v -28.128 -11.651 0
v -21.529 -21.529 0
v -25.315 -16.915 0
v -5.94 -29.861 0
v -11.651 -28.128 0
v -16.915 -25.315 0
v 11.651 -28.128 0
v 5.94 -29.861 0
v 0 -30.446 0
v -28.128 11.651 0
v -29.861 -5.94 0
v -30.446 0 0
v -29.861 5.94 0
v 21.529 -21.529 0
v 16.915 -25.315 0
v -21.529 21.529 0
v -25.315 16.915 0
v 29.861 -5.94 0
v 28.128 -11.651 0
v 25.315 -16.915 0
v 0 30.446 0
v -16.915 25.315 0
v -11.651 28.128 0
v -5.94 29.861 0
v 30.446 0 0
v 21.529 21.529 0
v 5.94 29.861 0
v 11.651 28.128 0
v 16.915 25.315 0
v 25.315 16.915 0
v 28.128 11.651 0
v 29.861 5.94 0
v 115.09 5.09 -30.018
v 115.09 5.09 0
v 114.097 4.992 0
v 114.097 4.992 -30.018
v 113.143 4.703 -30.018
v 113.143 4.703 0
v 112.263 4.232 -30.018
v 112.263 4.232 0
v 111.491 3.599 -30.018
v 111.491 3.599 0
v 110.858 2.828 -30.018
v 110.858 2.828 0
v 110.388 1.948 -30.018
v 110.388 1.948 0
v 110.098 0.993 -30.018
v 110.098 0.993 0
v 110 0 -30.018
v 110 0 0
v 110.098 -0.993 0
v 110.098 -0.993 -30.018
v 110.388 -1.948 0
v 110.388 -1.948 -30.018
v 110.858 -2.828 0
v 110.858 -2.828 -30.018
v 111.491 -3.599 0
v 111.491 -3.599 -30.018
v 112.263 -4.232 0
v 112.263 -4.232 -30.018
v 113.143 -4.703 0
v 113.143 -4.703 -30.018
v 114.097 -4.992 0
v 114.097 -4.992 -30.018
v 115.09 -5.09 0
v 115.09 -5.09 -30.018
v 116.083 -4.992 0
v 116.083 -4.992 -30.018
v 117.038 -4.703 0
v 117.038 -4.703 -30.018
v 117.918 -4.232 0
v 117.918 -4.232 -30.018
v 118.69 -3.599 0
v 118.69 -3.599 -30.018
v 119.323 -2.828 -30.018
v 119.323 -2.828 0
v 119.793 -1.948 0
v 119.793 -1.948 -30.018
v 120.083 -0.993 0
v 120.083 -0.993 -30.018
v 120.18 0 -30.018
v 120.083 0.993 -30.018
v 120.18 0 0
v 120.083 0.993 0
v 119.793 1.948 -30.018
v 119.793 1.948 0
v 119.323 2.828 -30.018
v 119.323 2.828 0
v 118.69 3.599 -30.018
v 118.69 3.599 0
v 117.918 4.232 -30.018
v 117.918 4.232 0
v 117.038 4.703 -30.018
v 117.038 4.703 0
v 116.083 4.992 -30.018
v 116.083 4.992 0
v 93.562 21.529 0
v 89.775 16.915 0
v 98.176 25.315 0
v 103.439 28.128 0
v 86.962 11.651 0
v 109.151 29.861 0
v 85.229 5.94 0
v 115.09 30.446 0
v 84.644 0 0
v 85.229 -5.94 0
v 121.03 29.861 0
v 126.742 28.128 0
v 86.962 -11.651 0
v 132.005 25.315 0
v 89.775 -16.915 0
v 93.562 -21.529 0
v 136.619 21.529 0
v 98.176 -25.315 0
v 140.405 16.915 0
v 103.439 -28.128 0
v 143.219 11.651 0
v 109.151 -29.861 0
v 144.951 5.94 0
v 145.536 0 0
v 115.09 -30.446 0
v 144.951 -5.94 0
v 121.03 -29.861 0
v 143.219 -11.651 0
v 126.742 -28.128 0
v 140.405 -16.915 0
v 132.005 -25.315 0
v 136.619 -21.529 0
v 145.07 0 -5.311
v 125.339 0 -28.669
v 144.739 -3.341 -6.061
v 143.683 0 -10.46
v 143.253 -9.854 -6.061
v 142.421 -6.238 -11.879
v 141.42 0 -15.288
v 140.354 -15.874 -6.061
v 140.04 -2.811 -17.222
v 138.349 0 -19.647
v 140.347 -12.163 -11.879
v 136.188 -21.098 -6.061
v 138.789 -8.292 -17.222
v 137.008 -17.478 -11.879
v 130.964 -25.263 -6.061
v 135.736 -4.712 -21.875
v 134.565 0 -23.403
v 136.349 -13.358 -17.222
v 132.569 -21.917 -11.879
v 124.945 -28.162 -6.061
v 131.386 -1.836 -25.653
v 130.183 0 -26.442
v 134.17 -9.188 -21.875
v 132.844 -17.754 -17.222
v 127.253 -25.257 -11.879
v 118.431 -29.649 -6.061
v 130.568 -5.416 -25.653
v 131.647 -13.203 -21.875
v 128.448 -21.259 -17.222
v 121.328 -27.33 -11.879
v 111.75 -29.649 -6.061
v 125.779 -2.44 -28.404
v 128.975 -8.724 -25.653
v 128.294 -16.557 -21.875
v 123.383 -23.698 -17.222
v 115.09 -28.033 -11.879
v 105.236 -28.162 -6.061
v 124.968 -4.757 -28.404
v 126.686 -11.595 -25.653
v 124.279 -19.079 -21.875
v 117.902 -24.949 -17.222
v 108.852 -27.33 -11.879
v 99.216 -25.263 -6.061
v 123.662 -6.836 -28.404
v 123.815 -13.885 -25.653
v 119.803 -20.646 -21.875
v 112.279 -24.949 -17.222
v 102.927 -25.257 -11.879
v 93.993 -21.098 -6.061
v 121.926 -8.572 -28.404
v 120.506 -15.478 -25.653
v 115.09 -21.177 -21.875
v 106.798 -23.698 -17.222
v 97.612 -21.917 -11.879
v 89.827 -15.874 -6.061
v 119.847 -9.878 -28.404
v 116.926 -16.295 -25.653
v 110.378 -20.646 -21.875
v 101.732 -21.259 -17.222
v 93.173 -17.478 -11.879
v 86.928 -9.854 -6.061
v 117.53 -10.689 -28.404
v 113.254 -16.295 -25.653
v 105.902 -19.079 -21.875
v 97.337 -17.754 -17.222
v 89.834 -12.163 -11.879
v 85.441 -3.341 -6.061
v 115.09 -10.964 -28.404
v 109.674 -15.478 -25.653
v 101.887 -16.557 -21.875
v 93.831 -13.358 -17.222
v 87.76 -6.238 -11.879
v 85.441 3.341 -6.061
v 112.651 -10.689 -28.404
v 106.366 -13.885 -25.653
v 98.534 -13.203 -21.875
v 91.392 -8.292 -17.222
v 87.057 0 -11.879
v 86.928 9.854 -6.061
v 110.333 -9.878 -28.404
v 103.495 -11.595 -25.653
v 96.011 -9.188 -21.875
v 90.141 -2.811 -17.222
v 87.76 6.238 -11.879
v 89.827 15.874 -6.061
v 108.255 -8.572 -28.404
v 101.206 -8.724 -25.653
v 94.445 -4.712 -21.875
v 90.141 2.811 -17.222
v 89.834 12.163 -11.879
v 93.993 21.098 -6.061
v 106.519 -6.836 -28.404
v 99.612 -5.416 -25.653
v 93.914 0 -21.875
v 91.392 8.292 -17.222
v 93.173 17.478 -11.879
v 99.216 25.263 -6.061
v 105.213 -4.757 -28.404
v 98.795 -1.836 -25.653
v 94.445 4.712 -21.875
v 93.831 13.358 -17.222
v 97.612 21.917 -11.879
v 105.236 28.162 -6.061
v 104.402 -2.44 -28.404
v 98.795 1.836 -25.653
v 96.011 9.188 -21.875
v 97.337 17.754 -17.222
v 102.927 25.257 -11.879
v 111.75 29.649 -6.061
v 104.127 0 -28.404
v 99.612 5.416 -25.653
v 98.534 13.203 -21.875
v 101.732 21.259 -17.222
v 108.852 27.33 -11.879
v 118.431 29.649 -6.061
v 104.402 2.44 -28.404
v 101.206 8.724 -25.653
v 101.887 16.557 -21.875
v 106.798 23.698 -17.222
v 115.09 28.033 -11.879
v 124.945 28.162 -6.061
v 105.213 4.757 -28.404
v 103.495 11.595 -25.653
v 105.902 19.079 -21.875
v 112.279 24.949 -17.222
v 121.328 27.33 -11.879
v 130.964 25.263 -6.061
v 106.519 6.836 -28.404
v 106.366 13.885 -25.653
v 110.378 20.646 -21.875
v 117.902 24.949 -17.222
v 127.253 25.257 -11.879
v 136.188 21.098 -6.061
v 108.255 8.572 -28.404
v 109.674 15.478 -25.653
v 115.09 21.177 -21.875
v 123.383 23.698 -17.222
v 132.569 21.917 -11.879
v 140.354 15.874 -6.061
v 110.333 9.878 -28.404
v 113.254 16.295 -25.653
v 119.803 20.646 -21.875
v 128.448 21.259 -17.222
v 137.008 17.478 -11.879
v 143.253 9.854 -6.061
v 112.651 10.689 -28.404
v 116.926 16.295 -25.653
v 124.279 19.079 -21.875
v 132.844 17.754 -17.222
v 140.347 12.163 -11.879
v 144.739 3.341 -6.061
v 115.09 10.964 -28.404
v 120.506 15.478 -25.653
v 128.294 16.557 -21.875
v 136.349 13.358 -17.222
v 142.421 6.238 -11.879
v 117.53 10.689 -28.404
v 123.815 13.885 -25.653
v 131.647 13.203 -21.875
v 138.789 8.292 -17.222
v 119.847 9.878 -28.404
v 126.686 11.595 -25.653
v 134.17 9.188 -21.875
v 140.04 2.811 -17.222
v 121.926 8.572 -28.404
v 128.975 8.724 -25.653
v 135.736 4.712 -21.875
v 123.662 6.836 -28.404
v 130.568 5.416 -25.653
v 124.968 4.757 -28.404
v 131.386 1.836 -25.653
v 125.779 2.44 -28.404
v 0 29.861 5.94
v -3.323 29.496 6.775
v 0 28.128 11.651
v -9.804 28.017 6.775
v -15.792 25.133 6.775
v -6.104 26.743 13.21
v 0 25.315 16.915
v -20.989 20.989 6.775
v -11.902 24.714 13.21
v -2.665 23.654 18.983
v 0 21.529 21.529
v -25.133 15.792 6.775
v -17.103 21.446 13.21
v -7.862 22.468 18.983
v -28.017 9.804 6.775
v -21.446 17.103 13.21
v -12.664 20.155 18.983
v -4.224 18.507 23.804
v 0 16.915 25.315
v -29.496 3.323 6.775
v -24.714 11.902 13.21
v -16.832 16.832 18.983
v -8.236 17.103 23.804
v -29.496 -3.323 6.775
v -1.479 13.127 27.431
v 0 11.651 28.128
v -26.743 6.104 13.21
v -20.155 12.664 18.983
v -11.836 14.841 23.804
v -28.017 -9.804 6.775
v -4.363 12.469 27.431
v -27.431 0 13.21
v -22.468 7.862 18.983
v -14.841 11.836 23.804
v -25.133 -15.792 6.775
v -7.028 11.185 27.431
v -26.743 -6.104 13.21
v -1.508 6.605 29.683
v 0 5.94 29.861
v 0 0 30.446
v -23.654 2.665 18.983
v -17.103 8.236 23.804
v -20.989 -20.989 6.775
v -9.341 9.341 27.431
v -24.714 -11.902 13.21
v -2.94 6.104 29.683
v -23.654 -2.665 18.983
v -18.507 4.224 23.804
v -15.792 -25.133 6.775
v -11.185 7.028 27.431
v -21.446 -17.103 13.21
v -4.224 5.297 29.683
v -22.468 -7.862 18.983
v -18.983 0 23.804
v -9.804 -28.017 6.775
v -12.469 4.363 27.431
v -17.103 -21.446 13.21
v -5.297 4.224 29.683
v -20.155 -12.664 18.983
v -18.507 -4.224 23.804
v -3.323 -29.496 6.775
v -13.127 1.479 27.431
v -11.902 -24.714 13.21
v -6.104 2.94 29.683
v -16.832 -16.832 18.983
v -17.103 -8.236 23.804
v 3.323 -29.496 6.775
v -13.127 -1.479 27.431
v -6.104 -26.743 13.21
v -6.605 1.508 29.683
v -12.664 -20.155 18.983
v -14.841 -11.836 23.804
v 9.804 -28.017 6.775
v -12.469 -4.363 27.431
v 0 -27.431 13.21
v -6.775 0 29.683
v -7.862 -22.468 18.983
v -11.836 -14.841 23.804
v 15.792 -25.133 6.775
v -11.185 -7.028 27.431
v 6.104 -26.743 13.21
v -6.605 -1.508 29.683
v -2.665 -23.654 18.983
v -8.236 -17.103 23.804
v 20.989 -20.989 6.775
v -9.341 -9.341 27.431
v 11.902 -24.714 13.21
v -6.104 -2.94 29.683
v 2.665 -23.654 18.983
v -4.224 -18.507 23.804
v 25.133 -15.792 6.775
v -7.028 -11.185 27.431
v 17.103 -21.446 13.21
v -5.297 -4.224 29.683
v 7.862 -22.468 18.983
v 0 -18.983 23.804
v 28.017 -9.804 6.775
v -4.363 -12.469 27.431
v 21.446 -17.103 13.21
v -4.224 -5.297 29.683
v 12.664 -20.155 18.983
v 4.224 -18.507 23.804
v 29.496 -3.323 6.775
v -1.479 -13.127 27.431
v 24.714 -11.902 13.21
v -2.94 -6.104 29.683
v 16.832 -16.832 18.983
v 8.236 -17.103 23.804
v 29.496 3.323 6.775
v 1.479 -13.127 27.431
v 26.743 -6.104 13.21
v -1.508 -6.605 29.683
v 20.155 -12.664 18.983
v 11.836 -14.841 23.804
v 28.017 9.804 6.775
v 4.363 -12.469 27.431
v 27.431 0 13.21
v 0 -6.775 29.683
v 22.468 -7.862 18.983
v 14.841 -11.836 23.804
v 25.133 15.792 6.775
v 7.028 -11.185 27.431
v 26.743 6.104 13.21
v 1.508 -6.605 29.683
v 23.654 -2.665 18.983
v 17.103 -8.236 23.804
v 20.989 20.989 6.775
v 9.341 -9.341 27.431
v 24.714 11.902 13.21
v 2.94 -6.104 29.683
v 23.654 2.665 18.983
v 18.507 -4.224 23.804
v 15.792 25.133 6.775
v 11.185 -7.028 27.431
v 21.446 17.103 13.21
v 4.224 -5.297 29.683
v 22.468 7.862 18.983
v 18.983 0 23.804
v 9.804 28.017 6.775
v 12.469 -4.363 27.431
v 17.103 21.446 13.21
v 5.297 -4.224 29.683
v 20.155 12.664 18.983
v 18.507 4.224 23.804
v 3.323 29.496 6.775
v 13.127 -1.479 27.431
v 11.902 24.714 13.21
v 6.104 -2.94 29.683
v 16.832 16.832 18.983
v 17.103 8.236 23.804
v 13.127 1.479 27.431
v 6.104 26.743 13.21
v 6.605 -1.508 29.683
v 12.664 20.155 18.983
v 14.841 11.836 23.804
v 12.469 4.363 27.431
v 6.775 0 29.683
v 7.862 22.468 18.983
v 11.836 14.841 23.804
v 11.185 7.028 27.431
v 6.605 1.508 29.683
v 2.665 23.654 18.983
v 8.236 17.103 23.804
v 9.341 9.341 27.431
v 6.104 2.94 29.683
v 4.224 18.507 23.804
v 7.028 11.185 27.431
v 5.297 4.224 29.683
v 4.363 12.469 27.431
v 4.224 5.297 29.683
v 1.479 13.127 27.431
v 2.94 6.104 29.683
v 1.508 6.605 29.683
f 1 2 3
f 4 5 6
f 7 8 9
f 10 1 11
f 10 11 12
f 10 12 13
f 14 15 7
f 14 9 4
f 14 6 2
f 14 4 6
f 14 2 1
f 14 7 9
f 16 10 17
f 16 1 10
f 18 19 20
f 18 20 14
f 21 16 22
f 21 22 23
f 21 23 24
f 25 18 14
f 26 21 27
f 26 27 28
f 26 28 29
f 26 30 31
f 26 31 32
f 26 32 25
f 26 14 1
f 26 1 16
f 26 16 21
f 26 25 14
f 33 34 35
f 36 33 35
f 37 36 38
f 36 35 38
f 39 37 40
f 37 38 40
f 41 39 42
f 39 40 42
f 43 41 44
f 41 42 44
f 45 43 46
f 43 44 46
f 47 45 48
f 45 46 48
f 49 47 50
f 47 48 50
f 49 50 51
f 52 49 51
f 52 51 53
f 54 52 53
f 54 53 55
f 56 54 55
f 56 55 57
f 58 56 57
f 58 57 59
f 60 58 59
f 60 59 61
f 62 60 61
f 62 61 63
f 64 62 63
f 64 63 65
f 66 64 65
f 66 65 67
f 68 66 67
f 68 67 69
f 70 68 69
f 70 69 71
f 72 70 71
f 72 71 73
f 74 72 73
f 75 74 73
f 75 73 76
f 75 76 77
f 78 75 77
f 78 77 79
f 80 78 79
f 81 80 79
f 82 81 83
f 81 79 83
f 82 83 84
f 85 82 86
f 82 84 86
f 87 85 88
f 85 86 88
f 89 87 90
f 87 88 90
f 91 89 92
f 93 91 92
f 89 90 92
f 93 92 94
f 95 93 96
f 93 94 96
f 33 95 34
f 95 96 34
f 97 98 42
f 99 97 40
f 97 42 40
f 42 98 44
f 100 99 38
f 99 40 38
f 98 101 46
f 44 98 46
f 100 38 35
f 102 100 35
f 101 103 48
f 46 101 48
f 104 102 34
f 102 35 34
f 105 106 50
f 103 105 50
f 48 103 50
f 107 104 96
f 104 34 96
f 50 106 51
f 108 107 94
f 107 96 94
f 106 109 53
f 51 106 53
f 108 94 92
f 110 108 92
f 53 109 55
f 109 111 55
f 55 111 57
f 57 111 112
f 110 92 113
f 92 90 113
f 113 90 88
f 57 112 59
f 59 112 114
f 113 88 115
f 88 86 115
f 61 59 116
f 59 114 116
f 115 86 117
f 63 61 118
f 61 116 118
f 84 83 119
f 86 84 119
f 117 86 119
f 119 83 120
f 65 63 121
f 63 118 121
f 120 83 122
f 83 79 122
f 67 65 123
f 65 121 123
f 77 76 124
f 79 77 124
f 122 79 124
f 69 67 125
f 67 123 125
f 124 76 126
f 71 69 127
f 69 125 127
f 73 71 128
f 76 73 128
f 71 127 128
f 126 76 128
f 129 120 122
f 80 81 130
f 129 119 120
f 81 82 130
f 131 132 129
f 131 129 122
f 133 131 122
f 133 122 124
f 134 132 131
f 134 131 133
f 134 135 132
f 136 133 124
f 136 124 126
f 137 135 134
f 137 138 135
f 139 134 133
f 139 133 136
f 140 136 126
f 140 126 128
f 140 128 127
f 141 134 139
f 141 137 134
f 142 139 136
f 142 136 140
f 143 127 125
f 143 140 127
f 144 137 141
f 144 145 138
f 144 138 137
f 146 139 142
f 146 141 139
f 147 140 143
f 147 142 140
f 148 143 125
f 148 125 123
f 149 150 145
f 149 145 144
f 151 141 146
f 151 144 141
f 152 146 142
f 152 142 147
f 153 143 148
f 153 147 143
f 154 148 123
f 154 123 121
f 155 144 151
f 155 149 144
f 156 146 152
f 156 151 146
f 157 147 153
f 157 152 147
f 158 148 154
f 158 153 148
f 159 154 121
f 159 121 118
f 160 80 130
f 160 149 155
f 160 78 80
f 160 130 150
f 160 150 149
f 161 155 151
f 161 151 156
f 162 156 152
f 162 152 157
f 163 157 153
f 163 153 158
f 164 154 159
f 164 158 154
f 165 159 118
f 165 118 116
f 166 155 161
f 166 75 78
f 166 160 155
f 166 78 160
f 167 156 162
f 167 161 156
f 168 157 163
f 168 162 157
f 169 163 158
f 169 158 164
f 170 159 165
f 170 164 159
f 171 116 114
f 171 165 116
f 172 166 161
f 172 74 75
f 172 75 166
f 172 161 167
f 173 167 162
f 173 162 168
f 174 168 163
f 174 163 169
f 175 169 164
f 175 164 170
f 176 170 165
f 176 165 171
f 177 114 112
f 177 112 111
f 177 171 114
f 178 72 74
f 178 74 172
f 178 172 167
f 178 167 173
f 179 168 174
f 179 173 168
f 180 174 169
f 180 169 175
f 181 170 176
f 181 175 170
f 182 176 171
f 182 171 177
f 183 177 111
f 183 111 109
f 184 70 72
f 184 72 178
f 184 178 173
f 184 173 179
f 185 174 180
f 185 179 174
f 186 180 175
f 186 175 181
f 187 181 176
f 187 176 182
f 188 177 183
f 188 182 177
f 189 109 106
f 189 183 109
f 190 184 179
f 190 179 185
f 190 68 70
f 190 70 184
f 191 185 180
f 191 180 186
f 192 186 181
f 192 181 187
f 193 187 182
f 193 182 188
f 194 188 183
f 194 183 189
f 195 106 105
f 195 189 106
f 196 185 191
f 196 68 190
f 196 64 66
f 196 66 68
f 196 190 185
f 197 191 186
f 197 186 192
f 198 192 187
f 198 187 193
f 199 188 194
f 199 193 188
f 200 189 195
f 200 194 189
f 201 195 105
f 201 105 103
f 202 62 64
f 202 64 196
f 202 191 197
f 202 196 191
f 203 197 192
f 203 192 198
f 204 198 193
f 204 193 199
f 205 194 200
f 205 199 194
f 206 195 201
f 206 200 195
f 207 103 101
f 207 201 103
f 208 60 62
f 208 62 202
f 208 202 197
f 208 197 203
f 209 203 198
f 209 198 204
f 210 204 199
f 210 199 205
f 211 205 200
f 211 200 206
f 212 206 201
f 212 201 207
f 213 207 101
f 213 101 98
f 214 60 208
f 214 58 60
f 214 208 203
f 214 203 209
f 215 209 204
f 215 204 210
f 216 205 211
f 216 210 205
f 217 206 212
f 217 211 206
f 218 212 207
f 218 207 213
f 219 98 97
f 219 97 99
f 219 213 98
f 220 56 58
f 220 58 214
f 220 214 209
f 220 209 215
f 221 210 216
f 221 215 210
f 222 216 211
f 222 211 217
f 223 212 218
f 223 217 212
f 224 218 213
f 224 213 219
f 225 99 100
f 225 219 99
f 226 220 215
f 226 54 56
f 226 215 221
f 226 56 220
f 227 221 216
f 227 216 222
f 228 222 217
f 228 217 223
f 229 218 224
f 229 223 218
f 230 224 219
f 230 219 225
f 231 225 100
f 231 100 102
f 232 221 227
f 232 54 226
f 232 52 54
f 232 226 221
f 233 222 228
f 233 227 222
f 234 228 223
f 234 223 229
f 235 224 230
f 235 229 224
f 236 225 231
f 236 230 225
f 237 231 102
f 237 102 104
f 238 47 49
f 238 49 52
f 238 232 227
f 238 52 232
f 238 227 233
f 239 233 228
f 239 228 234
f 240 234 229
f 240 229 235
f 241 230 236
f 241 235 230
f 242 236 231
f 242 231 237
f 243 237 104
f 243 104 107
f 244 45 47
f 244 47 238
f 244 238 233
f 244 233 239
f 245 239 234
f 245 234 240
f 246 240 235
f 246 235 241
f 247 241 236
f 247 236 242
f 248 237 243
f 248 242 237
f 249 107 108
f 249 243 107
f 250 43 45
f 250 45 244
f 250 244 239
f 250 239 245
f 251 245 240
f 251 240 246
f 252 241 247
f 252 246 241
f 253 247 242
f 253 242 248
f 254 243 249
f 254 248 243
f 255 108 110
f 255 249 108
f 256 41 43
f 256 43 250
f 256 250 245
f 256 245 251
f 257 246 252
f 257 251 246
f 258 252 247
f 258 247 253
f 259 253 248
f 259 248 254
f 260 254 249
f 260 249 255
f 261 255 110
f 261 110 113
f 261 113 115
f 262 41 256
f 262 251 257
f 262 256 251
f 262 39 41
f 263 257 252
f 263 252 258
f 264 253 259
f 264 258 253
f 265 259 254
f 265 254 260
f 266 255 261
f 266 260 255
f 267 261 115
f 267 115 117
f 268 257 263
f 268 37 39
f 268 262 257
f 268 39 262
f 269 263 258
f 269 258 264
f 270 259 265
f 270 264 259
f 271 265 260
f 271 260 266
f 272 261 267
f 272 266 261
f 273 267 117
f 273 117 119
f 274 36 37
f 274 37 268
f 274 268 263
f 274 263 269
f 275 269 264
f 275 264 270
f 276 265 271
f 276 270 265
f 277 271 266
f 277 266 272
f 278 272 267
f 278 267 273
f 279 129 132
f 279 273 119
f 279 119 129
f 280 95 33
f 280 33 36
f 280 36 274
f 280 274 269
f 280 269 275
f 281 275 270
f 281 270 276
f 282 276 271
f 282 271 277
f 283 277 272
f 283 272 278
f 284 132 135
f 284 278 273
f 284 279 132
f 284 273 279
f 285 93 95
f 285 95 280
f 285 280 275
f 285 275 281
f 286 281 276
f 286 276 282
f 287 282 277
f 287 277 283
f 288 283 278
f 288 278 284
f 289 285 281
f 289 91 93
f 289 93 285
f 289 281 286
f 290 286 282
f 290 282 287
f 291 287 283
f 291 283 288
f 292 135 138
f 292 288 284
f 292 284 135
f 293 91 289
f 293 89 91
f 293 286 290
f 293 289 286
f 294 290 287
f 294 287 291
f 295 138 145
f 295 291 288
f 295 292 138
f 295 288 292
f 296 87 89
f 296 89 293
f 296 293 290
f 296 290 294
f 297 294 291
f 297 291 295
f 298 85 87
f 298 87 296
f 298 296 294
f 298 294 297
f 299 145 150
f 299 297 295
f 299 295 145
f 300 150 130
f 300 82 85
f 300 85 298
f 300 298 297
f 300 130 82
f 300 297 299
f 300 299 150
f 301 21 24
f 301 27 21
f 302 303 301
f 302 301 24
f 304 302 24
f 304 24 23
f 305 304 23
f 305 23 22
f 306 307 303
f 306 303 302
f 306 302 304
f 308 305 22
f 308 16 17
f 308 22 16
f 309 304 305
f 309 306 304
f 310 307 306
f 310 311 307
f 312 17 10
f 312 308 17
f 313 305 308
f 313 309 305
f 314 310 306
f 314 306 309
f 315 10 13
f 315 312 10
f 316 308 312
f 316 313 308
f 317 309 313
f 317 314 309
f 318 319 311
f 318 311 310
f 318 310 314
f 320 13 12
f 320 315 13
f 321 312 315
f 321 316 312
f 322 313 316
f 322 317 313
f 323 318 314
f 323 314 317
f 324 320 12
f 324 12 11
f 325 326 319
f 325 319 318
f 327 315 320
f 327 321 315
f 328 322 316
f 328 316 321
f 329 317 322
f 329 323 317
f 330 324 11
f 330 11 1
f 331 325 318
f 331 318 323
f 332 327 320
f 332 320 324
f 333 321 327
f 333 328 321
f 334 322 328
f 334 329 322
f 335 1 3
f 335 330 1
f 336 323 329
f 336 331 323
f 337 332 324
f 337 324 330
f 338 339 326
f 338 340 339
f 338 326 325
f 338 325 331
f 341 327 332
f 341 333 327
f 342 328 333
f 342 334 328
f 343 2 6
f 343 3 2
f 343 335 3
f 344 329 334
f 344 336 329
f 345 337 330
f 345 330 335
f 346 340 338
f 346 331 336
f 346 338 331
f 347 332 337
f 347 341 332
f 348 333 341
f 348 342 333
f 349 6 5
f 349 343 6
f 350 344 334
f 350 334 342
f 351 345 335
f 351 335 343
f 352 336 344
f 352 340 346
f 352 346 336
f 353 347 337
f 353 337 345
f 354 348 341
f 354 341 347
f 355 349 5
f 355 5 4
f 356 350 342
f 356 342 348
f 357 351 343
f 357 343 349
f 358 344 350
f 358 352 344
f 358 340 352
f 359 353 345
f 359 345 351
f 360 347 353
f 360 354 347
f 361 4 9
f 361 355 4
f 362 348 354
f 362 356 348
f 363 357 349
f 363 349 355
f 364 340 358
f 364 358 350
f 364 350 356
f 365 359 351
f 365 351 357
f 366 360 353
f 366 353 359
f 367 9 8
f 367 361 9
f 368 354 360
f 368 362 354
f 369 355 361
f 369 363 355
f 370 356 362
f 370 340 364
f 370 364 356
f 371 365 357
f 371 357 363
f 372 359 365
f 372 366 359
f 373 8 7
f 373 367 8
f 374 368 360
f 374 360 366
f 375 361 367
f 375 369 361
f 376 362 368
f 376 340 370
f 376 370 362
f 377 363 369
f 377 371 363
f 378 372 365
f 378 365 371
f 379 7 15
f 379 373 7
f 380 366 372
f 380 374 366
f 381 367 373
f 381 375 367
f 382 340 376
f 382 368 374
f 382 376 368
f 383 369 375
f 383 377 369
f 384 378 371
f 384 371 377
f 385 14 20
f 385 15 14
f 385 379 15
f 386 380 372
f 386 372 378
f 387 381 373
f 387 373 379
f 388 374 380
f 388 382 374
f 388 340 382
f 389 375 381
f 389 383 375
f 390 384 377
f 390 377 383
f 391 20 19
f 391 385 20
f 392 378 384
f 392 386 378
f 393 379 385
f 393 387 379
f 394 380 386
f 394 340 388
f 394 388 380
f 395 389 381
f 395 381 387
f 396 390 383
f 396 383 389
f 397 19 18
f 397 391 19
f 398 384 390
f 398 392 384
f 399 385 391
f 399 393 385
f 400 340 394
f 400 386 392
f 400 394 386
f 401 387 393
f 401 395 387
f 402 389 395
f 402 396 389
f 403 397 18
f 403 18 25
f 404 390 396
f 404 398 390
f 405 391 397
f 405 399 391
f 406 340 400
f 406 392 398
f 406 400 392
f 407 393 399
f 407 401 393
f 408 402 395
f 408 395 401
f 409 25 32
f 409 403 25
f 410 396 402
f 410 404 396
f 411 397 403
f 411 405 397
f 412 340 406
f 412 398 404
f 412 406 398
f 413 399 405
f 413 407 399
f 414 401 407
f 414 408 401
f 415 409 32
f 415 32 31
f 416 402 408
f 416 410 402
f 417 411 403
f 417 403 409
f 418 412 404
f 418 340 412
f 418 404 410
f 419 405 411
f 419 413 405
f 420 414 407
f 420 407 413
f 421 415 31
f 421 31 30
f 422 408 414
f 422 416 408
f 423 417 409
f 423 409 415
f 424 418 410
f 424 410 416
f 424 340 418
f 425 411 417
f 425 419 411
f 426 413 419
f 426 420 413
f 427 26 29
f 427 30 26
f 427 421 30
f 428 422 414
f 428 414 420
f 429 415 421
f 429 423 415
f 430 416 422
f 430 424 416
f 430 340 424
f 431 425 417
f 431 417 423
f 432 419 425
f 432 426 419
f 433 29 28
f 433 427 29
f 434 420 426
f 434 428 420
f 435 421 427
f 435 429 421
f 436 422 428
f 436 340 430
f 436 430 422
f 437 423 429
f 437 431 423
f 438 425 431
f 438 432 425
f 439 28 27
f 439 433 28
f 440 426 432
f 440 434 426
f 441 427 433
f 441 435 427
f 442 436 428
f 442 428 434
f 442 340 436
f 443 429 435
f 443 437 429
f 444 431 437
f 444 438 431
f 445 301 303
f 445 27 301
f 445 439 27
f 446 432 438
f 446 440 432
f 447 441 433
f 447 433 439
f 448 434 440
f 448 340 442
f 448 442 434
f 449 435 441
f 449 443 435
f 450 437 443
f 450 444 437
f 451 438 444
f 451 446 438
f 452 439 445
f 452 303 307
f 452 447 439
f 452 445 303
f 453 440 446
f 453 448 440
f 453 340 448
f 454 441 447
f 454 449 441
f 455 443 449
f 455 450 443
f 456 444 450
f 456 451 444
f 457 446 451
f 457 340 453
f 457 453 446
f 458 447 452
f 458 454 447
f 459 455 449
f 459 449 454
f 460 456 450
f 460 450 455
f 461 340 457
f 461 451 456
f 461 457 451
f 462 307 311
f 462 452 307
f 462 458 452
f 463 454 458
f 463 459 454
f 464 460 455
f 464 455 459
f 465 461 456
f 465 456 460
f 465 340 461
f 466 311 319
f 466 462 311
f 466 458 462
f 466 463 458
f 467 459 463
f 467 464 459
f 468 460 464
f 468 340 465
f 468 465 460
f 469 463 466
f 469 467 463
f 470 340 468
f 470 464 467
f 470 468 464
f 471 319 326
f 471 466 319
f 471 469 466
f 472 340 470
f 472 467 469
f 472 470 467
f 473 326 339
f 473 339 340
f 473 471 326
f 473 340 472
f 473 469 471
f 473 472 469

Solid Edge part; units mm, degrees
sketch "Sketch1" plane through (0, 0, 0) normal (1, 0, 0) x (0, 1, 0)
  arc A0 (30.446, 0) -> (0, 30.446) centre (0, 0) ccw
  line L0 (0, 30.446) -> (0, 0)
  line L1 (0, 0) -> (30.446, 0)
revolve "RevolvedProtrusion1" add sketch "Sketch1" angle 360 about axis through (0, 0, 30.446) along (0, 0, -1)
sketch "Sketch2" plane through (0, 0, 0) normal (0, -1, 0) x (1, 0, 0)
  line L0 (115.0904, 0) -> (115.0904, -30.446)
  line L1 (115.0904, 0) -> (145.5364, 0)
  arc A0 (145.5364, 0) -> (115.0904, -30.446) centre (115.0904, 0) cw
revolve "RevolvedProtrusion2" add sketch "Sketch2" angle 360 about axis through (115.0904, 0, 0) along (0, 0, -1)
sketch "Sketch3" plane through (115.0904, 0, 0) normal (0, 0, 1) x (0, 1, 0)
  circle A0 centre (0, 0) radius 5.09
extrude "Cutout1" cut sketch "Sketch3" against normal blind 60.1558
